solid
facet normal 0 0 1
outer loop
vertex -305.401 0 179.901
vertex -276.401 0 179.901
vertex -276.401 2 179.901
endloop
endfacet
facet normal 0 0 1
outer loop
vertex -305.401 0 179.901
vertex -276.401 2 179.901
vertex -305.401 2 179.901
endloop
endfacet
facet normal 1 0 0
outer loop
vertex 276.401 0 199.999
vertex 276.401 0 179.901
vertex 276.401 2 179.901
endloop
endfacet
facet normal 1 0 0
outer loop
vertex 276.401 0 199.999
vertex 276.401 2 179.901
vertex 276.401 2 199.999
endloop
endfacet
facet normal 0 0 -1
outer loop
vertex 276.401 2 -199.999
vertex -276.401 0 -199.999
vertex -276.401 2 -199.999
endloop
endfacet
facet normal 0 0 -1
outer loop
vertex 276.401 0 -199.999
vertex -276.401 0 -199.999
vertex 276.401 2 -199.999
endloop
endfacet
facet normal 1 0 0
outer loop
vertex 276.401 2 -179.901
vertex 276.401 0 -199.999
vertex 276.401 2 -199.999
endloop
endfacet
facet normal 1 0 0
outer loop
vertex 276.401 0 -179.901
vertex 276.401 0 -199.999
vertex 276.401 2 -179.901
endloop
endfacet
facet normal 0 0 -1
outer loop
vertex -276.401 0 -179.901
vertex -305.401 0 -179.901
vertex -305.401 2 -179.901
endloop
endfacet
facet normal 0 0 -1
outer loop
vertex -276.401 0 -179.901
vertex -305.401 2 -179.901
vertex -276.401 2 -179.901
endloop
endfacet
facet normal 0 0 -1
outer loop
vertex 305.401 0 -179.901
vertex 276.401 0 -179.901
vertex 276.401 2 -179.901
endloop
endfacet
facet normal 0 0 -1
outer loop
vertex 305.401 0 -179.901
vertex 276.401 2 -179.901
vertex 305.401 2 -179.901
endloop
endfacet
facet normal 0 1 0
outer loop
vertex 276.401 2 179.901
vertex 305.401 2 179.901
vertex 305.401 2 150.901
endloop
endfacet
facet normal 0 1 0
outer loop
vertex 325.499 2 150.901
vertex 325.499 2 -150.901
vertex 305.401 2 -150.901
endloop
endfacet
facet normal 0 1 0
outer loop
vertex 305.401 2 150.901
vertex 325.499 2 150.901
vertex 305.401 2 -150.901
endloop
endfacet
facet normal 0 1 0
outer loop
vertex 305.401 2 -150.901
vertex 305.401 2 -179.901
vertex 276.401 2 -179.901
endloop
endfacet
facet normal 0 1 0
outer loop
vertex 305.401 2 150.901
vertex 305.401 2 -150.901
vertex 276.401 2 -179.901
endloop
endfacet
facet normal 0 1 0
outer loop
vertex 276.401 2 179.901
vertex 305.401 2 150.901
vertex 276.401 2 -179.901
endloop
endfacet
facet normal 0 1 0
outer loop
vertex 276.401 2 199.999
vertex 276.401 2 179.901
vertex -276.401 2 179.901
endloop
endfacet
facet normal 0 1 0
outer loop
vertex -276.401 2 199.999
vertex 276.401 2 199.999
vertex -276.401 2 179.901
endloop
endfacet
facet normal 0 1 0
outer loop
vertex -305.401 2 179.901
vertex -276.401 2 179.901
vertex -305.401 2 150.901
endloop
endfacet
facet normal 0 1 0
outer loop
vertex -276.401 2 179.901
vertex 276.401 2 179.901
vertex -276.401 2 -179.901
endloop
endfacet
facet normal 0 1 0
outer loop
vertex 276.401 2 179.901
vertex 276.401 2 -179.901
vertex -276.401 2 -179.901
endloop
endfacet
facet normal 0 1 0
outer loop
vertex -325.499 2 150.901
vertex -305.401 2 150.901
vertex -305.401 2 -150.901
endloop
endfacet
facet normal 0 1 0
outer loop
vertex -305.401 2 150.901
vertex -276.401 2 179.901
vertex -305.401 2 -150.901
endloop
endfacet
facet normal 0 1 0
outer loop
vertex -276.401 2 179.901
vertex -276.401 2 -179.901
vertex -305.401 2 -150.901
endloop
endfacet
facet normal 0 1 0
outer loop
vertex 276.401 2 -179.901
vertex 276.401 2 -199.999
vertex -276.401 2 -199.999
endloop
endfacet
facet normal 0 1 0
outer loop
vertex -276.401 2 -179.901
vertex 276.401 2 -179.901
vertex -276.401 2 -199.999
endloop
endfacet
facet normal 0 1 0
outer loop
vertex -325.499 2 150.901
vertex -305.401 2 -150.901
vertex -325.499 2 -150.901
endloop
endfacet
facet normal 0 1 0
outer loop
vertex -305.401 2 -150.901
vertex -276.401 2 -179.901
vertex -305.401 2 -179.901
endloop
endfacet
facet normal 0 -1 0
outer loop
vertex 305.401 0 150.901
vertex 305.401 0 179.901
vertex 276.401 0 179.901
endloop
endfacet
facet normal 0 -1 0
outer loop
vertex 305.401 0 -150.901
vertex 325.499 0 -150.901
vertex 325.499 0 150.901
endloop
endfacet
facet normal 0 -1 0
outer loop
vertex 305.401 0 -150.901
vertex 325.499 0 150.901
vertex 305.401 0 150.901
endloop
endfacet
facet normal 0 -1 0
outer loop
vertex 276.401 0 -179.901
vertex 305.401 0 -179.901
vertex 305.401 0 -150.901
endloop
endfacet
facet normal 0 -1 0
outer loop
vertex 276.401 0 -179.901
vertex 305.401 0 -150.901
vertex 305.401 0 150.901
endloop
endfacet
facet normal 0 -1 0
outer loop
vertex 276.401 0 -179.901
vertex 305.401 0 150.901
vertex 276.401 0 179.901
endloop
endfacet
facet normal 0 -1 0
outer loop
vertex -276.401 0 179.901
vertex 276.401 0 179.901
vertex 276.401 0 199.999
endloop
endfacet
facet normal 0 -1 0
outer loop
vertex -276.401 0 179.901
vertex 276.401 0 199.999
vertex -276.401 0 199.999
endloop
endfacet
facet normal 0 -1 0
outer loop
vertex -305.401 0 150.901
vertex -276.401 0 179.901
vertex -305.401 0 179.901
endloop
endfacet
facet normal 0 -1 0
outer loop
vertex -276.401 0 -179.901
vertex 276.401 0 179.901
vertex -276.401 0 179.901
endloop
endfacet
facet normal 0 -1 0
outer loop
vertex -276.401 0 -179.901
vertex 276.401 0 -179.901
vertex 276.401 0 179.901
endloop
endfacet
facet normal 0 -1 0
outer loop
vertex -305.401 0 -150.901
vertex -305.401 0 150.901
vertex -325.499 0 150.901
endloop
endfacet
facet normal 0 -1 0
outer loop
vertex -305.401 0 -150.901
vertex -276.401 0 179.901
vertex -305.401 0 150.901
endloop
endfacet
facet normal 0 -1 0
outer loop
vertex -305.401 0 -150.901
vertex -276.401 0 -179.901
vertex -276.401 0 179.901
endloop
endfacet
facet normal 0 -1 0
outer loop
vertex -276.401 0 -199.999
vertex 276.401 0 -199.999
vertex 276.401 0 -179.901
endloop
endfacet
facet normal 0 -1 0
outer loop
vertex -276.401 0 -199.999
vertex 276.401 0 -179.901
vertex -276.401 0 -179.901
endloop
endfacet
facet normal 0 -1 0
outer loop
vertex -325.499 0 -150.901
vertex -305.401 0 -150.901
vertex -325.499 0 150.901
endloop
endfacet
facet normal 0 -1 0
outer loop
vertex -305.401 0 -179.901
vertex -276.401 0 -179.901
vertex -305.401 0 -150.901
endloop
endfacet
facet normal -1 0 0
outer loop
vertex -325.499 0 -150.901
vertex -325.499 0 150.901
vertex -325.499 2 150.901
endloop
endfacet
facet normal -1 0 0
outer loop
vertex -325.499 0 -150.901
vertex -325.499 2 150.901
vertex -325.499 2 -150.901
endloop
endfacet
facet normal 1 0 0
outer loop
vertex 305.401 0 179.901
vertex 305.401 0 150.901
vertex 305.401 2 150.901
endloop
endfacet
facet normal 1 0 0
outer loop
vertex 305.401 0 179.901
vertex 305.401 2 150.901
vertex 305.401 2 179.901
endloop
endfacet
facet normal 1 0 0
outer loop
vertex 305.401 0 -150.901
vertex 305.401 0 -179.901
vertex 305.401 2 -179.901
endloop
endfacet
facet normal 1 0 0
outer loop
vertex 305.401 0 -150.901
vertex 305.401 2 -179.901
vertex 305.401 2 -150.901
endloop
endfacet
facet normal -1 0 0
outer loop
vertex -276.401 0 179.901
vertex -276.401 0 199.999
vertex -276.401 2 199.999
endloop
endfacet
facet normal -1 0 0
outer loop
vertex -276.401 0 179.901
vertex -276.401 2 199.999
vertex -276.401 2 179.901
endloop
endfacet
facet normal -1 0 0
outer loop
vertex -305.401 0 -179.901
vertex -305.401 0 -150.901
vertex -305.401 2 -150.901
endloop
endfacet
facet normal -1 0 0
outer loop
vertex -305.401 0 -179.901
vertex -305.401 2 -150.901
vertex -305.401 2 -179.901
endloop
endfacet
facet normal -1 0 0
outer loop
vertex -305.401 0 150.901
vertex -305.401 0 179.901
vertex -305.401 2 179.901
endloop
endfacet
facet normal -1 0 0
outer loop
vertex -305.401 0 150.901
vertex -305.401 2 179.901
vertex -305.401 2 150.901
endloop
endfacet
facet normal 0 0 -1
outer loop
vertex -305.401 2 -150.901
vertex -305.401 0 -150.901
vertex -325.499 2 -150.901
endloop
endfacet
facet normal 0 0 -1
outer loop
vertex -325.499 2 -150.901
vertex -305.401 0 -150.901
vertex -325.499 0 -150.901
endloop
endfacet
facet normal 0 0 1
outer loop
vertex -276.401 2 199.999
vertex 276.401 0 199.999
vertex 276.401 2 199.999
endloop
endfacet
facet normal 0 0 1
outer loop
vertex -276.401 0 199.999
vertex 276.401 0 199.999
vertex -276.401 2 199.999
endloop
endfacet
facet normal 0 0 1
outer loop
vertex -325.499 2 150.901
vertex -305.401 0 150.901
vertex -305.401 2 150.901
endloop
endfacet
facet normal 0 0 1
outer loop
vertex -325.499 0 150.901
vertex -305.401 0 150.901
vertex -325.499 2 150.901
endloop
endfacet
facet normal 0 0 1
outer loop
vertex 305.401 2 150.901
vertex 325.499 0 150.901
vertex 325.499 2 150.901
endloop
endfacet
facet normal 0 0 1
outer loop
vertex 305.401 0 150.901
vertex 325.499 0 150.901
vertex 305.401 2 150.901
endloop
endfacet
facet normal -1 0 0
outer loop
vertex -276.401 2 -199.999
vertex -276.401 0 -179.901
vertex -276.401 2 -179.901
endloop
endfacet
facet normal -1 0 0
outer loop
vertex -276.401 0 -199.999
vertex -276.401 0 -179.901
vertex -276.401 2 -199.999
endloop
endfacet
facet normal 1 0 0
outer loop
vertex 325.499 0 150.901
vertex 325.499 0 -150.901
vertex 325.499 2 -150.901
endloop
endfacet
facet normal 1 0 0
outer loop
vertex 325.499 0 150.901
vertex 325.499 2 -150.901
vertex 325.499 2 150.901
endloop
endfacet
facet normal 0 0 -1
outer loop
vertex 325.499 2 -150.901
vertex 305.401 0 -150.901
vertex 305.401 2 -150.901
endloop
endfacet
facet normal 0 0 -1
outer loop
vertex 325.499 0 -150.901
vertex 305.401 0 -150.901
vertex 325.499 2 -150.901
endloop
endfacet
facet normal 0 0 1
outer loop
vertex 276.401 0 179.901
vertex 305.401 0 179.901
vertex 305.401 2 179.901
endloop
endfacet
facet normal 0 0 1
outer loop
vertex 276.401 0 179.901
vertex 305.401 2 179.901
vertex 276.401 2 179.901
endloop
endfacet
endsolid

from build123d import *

# Parameters (mm, degrees)
BOSS_EXTRUDE1_DEPTH = 2


with BuildPart() as part:
    # Sketch1 → Boss-Extrude1 (new body)
    with BuildSketch(Plane(origin=(0, 0, 0), x_dir=(1, 0, 0), z_dir=(0, 1, 0))):
        Polygon((-325.499342603, 150.901111002), (-307.000657397, 150.901111002), (-305.400657397, 150.901111002), (-305.400657397, 179.901111002), (-276.400657397, 179.901111002), (-276.400657397, 199.998908398), (276.400657397, 199.998908398), (276.400657397, 179.901111002), (305.400657397, 179.901111002), (305.400657397, 150.901111002), (325.499342603, 150.901111002), (325.499342603, -150.901091602), (305.400657397, -150.901091602), (305.400657397, -179.901091602), (276.400657397, -179.901091602), (276.400657397, -199.998908398), (-276.400657397, -199.998908398), (-276.400657397, -179.901091602), (-305.400657397, -179.901091602), (-305.400657397, -150.901091602), (-325.499342603, -150.901091602), align=None)
    extrude(amount=BOSS_EXTRUDE1_DEPTH)


solid = part.part
